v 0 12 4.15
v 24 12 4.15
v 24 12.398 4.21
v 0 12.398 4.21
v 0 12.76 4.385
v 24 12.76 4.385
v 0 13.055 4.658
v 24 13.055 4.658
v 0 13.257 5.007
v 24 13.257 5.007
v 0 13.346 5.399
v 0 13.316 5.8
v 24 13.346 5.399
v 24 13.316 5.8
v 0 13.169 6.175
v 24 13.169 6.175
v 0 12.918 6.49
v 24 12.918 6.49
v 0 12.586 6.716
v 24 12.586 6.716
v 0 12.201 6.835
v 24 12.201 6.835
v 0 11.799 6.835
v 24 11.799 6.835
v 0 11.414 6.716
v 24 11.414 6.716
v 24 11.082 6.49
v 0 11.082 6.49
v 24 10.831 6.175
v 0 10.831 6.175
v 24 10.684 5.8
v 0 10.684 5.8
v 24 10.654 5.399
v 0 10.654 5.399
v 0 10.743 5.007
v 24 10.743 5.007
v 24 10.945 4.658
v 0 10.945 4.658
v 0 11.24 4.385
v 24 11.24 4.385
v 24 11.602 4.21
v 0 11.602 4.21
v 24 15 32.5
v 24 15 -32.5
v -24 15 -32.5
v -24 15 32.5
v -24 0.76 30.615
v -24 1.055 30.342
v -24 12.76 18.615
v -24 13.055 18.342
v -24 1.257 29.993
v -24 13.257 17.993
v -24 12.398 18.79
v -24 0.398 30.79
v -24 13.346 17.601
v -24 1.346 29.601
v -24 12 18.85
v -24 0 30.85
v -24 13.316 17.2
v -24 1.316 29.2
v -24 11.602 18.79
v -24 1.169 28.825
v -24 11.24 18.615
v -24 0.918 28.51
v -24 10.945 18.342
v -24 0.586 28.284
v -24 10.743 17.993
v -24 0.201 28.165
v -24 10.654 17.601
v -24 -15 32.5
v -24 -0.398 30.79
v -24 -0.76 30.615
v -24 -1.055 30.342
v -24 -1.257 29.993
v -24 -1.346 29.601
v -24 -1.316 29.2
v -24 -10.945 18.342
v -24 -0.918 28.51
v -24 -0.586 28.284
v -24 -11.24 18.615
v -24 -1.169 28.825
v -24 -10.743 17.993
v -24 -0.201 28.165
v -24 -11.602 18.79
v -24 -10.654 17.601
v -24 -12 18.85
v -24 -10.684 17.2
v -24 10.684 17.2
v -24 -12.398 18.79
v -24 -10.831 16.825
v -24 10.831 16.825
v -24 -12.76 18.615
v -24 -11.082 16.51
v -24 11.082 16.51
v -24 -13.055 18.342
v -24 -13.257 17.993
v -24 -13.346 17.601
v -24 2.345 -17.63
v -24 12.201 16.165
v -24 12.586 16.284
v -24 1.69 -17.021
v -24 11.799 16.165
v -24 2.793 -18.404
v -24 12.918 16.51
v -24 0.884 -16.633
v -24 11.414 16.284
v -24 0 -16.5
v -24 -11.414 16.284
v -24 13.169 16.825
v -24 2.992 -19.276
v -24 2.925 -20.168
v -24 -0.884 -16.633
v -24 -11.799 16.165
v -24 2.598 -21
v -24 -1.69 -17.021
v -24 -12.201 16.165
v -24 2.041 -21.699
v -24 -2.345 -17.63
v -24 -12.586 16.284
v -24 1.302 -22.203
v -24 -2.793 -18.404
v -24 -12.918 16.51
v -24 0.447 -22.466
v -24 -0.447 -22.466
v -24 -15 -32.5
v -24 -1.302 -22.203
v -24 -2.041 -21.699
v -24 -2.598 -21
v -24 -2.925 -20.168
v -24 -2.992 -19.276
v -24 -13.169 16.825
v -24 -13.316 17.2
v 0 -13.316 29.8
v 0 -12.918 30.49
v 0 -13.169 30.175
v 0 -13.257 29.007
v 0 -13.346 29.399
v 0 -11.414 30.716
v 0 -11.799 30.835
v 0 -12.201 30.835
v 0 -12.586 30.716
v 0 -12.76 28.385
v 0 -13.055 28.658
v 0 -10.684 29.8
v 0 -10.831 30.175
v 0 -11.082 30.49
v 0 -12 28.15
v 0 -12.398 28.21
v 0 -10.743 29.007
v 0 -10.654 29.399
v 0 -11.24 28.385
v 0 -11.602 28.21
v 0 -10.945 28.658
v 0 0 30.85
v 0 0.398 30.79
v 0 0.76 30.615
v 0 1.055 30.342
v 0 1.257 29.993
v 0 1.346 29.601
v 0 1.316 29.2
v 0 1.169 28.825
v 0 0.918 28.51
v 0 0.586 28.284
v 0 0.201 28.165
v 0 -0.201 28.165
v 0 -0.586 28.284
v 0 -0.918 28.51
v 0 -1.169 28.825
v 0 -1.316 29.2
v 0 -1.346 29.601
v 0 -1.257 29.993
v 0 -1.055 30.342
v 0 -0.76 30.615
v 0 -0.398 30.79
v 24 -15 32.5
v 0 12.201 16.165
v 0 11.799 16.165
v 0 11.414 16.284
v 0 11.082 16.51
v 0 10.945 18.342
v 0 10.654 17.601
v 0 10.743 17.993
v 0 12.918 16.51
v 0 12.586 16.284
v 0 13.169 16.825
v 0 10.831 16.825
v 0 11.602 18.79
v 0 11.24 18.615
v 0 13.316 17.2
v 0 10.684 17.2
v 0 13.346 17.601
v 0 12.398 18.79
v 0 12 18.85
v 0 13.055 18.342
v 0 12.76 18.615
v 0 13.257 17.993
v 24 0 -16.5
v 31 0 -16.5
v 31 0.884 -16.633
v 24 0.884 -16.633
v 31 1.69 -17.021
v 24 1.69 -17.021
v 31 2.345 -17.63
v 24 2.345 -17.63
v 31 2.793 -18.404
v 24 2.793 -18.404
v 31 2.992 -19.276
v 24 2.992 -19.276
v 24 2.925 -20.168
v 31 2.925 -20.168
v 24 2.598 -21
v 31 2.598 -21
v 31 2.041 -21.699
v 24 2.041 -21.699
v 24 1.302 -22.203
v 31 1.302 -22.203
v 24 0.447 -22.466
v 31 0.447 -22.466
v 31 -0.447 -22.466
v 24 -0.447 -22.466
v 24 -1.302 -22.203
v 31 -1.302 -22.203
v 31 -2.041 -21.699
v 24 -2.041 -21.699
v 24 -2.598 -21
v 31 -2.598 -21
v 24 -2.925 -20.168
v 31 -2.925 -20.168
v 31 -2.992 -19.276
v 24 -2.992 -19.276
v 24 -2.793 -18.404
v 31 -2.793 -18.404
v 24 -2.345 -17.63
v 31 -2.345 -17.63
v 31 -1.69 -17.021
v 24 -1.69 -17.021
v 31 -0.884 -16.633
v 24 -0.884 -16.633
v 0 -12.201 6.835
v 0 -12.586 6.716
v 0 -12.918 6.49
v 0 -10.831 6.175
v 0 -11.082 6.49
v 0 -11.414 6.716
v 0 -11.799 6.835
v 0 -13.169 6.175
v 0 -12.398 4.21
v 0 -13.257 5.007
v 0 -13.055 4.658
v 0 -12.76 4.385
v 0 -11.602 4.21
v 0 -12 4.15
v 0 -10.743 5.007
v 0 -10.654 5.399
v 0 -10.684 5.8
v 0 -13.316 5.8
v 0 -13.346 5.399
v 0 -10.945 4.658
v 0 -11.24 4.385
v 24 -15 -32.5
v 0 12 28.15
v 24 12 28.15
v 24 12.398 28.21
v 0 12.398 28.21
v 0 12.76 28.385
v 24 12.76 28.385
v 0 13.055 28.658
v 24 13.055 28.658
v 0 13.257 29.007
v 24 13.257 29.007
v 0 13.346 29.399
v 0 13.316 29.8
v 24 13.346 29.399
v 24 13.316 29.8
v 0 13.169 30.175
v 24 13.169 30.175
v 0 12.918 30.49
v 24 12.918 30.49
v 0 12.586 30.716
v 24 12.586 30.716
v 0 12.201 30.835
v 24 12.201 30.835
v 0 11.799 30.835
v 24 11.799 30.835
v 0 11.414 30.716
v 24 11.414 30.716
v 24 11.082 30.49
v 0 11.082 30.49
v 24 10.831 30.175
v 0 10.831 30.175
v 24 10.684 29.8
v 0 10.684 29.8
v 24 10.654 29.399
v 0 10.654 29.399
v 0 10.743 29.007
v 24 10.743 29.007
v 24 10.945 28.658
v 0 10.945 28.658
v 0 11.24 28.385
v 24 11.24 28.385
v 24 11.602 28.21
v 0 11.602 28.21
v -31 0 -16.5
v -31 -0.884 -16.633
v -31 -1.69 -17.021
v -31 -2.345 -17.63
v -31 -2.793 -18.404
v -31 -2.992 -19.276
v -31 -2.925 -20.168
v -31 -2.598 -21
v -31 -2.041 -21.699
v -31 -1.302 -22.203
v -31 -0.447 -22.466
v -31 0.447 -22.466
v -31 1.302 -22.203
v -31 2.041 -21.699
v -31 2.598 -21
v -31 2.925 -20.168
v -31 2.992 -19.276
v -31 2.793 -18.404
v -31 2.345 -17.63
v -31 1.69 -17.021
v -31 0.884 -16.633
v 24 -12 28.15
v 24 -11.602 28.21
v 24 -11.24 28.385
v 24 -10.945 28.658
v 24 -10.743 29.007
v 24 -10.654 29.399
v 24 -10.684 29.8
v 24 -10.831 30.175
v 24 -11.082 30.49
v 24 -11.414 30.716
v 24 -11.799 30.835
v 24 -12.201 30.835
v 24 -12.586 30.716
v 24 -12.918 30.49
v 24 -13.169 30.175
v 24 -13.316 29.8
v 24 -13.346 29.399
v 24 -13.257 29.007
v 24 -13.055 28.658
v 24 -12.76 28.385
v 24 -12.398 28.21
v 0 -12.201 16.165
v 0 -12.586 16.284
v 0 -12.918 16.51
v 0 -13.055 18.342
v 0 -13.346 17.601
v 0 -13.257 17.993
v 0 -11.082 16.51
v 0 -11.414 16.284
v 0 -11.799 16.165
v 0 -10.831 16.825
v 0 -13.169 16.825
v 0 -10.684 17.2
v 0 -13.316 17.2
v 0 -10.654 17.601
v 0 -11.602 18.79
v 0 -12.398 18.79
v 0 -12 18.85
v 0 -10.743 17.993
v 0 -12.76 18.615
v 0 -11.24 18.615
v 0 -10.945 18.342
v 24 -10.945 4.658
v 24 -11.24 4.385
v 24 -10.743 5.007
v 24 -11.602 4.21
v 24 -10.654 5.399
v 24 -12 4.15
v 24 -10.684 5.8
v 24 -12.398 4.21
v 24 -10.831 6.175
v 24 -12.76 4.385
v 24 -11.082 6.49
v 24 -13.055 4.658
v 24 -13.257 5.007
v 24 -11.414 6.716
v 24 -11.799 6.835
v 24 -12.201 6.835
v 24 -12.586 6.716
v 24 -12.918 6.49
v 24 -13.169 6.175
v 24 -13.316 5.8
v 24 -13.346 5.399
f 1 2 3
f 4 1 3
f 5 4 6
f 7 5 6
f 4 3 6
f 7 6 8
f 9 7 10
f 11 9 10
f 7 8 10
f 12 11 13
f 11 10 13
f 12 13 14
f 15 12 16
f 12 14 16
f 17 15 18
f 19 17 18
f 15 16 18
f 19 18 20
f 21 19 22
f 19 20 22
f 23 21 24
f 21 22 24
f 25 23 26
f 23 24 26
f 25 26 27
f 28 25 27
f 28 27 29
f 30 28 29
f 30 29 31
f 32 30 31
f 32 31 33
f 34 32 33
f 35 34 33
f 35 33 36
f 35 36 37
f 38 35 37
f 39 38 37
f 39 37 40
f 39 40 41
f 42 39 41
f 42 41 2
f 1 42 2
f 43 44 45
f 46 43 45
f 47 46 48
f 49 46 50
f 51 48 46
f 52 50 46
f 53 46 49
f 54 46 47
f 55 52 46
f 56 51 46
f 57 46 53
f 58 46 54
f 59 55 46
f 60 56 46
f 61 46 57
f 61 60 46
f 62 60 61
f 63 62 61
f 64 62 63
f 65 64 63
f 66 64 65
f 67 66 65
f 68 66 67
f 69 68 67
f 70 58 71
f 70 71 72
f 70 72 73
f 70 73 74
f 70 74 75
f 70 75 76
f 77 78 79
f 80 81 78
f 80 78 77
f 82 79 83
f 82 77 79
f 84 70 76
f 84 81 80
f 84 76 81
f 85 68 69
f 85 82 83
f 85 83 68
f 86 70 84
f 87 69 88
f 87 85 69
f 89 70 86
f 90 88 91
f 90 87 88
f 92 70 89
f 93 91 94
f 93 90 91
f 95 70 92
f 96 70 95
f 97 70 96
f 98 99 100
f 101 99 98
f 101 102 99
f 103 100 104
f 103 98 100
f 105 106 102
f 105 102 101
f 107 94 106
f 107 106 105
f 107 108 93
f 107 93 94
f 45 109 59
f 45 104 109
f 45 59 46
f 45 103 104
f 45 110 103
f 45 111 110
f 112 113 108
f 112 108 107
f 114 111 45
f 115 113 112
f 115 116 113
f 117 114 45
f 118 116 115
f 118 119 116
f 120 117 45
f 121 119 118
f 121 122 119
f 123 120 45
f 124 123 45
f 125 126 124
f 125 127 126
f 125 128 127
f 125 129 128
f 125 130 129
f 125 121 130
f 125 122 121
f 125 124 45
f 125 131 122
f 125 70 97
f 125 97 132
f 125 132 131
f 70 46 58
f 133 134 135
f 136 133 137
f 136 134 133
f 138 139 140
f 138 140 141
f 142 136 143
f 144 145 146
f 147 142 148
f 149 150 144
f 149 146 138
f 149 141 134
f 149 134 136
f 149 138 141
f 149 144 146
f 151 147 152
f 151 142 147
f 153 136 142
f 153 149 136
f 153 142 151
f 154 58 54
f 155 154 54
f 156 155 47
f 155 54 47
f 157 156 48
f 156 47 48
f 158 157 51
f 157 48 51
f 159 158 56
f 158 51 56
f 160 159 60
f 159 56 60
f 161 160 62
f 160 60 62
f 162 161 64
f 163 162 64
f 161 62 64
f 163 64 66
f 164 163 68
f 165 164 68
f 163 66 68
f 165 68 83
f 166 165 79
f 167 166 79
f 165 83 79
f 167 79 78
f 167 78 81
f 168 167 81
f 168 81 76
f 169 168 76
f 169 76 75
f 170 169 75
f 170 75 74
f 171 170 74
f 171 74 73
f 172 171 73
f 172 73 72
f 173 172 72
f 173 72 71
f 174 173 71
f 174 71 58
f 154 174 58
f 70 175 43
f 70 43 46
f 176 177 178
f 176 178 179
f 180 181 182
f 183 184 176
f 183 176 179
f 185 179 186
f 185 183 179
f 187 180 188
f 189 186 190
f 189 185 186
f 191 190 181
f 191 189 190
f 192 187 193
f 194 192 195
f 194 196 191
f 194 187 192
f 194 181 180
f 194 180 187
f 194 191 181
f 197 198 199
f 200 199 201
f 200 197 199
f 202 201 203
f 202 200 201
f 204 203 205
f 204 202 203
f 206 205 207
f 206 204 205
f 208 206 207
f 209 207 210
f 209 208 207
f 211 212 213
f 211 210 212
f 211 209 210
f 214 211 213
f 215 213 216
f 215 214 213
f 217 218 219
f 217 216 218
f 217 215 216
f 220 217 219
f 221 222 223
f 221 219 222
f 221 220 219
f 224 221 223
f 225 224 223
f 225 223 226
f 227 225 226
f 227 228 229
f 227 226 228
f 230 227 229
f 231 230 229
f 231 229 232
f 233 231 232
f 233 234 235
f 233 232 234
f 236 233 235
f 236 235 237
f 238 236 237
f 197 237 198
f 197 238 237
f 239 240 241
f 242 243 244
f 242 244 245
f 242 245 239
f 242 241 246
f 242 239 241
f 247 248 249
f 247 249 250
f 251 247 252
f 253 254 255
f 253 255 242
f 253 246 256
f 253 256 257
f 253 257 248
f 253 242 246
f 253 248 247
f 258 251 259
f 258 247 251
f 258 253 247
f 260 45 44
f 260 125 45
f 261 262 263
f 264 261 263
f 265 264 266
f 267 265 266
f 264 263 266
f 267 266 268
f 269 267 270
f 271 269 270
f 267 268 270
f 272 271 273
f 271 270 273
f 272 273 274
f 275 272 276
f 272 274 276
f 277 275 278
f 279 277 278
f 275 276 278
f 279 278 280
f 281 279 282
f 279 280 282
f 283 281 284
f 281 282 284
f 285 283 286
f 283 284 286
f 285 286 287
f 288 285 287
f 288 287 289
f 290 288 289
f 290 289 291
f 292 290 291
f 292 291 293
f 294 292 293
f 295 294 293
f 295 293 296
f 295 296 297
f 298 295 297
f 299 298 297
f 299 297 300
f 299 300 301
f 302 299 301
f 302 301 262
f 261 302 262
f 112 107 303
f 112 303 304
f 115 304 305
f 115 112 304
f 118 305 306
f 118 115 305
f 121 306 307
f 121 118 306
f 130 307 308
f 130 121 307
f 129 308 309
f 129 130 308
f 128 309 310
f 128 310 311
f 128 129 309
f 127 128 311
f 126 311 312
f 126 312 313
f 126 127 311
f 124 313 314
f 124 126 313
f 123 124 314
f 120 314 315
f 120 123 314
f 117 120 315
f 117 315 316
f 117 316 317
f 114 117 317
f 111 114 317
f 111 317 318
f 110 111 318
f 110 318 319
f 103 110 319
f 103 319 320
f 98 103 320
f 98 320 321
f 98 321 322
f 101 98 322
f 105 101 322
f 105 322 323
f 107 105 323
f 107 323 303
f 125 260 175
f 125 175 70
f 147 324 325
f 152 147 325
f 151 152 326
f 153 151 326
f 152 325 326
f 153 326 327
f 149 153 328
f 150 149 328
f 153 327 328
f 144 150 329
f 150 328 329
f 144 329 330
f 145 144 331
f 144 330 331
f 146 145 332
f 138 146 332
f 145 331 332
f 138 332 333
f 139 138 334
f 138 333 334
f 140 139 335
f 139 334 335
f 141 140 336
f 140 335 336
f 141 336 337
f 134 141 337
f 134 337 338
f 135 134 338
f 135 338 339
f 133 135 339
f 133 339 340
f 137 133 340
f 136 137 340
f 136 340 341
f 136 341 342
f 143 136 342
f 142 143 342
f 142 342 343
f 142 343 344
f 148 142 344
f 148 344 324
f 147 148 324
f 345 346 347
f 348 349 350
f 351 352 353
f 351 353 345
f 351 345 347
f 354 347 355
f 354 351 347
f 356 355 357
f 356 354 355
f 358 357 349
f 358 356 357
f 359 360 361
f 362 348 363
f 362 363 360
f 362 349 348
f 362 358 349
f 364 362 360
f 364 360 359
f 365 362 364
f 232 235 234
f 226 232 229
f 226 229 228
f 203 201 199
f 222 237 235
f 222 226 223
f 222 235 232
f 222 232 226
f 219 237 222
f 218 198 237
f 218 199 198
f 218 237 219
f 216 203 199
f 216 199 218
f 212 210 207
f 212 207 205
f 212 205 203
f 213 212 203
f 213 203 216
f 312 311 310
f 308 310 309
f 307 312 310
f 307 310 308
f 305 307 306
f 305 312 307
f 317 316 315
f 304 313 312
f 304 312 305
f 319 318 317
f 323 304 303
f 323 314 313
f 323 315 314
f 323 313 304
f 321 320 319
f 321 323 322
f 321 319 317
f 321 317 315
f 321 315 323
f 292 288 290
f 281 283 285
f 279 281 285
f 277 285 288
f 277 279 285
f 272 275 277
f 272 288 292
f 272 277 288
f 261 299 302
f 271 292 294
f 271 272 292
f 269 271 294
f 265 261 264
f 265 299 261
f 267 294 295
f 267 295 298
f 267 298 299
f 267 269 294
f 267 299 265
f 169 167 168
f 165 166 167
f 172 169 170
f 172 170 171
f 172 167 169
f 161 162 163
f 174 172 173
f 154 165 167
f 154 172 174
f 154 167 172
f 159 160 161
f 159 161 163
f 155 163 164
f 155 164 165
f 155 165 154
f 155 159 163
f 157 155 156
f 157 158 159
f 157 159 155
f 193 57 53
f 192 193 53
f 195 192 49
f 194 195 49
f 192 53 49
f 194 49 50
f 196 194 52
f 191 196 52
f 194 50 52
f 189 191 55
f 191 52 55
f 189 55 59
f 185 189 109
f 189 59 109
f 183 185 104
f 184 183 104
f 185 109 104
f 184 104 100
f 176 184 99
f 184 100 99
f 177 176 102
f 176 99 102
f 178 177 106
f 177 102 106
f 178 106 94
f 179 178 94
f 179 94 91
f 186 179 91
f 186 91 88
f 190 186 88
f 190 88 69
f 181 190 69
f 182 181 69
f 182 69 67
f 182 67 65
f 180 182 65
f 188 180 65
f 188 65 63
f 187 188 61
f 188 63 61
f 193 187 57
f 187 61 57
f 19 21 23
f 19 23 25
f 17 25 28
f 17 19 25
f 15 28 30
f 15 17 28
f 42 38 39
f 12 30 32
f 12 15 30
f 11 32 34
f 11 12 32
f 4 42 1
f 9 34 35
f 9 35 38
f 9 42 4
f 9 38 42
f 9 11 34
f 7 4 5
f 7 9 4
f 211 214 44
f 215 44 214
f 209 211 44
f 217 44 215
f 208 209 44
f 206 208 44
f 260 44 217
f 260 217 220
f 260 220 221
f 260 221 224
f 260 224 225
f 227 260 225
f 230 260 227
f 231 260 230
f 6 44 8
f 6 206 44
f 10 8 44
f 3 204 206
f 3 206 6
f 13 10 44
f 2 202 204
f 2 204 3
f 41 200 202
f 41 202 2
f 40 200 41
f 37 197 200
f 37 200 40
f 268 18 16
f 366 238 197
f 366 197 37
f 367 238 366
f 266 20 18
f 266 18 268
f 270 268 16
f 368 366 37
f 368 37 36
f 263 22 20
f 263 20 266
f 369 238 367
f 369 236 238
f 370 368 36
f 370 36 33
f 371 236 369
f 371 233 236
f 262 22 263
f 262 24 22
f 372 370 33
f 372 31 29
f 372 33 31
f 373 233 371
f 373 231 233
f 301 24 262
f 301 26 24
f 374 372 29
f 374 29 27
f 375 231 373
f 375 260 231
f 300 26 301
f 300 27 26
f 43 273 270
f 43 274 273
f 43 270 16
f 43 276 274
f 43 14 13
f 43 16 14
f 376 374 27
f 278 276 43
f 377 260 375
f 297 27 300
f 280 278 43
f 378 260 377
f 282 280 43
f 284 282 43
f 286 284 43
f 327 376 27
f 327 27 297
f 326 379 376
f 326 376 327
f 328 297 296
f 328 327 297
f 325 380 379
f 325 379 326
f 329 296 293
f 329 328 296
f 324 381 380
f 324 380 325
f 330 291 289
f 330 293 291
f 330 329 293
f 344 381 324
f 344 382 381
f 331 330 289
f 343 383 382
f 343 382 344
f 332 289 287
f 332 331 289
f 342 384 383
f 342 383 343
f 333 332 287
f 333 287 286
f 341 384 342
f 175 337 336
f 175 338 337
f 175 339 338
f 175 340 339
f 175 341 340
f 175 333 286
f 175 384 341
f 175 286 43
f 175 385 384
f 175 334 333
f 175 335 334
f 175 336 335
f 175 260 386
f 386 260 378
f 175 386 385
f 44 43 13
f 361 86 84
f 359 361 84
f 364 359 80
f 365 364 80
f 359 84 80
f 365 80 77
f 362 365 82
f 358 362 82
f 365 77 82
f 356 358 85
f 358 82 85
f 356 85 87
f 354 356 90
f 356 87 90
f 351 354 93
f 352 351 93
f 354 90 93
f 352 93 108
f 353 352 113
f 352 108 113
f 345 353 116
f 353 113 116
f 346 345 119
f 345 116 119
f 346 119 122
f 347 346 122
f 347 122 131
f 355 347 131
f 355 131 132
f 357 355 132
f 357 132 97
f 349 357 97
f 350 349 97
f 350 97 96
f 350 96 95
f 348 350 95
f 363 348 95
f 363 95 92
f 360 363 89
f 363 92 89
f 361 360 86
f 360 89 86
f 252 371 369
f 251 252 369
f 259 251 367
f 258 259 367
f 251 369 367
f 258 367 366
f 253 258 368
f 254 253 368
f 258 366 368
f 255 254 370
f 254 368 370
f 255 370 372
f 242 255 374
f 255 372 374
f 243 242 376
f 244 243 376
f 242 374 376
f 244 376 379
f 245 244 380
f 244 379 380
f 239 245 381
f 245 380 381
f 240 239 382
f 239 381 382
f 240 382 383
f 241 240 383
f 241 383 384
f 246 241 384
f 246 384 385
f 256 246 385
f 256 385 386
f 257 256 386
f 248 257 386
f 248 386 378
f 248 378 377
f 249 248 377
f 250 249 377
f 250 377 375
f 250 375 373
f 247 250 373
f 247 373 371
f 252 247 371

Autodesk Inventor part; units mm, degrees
ref_plane "YZ Plane" through (0, 0, 0) normal (1, 0, 0) x (0, 1, 0)
ref_plane "XZ Plane" through (0, 0, 0) normal (0, 1, 0) x (-1, 0, 0)
ref_plane "XY Plane" through (0, 0, 0) normal (0, 0, 1) x (1, 0, 0)
sketch "Эскиз1" plane through (0, 0, 0) normal (0, 1, 0) x (-1, 0, 0)
  line L0 (24, -32.5) -> (-24, -32.5)
  line L1 (-24, -32.5) -> (-24, 32.5)
  line L2 (-24, 32.5) -> (24, 32.5)
  line L3 (24, 32.5) -> (24, -32.5)
  line L4 (24, -32.5) -> (-24, 32.5) construction
  line L5 (-24, -32.5) -> (24, 32.5) construction
  line L6 (-33.6, 0) -> (33.6, 0) construction
  line L7 (0, -45.5) -> (0, 45.5) projected
  point P0 (0, 0)
  point P1 (0, 0)
  point P2 (0, 0)
  dimension "d0" = 65
  dimension "d1" = 48
extrude "Выдавливание1" add sketch "Эскиз1" along normal mid plane 30
sketch "Эскиз2" plane through (24, -15, -32.5) normal (1, 0, 0) x (0, 0, -1)
  circle A0 centre (-62, 27) radius 1.35
  circle A1 centre (-38, 27) radius 1.35
  circle A2 centre (-38, 3) radius 1.35
  circle A3 centre (-62, 3) radius 1.35
  line L0 (-62, 27) -> (-38, 27) construction
  line L1 (-38, 27) -> (-38, 3) construction
  line L2 (-38, 3) -> (-62, 3) construction
  line L3 (-62, 27) -> (-62, 3) construction
  line L4 (-65, 30) -> (0, 30) projected
  line L5 (-65, 0) -> (-65, 30) projected
  point P0 (-32.5, 15)
  dimension "d4" = 2.7
  dimension "d9" = 24
  dimension "d10" = 3
  dimension "d11" = 3
extrude "Выдавливание2" cut sketch "Эскиз2" against normal up to surface (24 mm away)
sketch "Эскиз3" plane through (-24, -15, 32.5) normal (-1, 0, 0) x (0, 0, 1)
  line L0 (-15, 27) -> (-3, 27)
  line L1 (-3, 27) -> (-3, 3)
  line L2 (-3, 3) -> (-15, 3)
  circle A0 centre (-3, 15) radius 1.35
  circle A1 centre (-15, 27) radius 1.35
  circle A2 centre (-15, 3) radius 1.35
  line L3 (-65, 30) -> (0, 30) projected
  line L4 (0, 30) -> (0, 0) projected
  point P0 (-32.5, 15)
  dimension "d14" = 24
  dimension "d15" = 12
  dimension "d17" = 2.7
  dimension "d18" = 3
  dimension "d19" = 3
extrude "Выдавливание3" cut sketch "Эскиз3" against normal up to surface (24 mm away)
sketch "Эскиз4" plane through (-24, -15, 32.5) normal (-1, 0, 0) x (0, 0, 1)
  circle A0 centre (-52, 15) radius 3
  line L0 (-78, 15) -> (13, 15) projected
  line L1 (-65, 0) -> (-65, 30) projected
  point P0 (-32.5, 15)
  dimension "d22" = 6
  dimension "d23" = 13
extrude "Выдавливание4" add sketch "Эскиз4" along normal blind 7
mirror "Зеркальное отражение1" about plane through (0, 0, 0) normal (1, 0, 0) of "Выдавливание4"
properties part number "рдс150"
